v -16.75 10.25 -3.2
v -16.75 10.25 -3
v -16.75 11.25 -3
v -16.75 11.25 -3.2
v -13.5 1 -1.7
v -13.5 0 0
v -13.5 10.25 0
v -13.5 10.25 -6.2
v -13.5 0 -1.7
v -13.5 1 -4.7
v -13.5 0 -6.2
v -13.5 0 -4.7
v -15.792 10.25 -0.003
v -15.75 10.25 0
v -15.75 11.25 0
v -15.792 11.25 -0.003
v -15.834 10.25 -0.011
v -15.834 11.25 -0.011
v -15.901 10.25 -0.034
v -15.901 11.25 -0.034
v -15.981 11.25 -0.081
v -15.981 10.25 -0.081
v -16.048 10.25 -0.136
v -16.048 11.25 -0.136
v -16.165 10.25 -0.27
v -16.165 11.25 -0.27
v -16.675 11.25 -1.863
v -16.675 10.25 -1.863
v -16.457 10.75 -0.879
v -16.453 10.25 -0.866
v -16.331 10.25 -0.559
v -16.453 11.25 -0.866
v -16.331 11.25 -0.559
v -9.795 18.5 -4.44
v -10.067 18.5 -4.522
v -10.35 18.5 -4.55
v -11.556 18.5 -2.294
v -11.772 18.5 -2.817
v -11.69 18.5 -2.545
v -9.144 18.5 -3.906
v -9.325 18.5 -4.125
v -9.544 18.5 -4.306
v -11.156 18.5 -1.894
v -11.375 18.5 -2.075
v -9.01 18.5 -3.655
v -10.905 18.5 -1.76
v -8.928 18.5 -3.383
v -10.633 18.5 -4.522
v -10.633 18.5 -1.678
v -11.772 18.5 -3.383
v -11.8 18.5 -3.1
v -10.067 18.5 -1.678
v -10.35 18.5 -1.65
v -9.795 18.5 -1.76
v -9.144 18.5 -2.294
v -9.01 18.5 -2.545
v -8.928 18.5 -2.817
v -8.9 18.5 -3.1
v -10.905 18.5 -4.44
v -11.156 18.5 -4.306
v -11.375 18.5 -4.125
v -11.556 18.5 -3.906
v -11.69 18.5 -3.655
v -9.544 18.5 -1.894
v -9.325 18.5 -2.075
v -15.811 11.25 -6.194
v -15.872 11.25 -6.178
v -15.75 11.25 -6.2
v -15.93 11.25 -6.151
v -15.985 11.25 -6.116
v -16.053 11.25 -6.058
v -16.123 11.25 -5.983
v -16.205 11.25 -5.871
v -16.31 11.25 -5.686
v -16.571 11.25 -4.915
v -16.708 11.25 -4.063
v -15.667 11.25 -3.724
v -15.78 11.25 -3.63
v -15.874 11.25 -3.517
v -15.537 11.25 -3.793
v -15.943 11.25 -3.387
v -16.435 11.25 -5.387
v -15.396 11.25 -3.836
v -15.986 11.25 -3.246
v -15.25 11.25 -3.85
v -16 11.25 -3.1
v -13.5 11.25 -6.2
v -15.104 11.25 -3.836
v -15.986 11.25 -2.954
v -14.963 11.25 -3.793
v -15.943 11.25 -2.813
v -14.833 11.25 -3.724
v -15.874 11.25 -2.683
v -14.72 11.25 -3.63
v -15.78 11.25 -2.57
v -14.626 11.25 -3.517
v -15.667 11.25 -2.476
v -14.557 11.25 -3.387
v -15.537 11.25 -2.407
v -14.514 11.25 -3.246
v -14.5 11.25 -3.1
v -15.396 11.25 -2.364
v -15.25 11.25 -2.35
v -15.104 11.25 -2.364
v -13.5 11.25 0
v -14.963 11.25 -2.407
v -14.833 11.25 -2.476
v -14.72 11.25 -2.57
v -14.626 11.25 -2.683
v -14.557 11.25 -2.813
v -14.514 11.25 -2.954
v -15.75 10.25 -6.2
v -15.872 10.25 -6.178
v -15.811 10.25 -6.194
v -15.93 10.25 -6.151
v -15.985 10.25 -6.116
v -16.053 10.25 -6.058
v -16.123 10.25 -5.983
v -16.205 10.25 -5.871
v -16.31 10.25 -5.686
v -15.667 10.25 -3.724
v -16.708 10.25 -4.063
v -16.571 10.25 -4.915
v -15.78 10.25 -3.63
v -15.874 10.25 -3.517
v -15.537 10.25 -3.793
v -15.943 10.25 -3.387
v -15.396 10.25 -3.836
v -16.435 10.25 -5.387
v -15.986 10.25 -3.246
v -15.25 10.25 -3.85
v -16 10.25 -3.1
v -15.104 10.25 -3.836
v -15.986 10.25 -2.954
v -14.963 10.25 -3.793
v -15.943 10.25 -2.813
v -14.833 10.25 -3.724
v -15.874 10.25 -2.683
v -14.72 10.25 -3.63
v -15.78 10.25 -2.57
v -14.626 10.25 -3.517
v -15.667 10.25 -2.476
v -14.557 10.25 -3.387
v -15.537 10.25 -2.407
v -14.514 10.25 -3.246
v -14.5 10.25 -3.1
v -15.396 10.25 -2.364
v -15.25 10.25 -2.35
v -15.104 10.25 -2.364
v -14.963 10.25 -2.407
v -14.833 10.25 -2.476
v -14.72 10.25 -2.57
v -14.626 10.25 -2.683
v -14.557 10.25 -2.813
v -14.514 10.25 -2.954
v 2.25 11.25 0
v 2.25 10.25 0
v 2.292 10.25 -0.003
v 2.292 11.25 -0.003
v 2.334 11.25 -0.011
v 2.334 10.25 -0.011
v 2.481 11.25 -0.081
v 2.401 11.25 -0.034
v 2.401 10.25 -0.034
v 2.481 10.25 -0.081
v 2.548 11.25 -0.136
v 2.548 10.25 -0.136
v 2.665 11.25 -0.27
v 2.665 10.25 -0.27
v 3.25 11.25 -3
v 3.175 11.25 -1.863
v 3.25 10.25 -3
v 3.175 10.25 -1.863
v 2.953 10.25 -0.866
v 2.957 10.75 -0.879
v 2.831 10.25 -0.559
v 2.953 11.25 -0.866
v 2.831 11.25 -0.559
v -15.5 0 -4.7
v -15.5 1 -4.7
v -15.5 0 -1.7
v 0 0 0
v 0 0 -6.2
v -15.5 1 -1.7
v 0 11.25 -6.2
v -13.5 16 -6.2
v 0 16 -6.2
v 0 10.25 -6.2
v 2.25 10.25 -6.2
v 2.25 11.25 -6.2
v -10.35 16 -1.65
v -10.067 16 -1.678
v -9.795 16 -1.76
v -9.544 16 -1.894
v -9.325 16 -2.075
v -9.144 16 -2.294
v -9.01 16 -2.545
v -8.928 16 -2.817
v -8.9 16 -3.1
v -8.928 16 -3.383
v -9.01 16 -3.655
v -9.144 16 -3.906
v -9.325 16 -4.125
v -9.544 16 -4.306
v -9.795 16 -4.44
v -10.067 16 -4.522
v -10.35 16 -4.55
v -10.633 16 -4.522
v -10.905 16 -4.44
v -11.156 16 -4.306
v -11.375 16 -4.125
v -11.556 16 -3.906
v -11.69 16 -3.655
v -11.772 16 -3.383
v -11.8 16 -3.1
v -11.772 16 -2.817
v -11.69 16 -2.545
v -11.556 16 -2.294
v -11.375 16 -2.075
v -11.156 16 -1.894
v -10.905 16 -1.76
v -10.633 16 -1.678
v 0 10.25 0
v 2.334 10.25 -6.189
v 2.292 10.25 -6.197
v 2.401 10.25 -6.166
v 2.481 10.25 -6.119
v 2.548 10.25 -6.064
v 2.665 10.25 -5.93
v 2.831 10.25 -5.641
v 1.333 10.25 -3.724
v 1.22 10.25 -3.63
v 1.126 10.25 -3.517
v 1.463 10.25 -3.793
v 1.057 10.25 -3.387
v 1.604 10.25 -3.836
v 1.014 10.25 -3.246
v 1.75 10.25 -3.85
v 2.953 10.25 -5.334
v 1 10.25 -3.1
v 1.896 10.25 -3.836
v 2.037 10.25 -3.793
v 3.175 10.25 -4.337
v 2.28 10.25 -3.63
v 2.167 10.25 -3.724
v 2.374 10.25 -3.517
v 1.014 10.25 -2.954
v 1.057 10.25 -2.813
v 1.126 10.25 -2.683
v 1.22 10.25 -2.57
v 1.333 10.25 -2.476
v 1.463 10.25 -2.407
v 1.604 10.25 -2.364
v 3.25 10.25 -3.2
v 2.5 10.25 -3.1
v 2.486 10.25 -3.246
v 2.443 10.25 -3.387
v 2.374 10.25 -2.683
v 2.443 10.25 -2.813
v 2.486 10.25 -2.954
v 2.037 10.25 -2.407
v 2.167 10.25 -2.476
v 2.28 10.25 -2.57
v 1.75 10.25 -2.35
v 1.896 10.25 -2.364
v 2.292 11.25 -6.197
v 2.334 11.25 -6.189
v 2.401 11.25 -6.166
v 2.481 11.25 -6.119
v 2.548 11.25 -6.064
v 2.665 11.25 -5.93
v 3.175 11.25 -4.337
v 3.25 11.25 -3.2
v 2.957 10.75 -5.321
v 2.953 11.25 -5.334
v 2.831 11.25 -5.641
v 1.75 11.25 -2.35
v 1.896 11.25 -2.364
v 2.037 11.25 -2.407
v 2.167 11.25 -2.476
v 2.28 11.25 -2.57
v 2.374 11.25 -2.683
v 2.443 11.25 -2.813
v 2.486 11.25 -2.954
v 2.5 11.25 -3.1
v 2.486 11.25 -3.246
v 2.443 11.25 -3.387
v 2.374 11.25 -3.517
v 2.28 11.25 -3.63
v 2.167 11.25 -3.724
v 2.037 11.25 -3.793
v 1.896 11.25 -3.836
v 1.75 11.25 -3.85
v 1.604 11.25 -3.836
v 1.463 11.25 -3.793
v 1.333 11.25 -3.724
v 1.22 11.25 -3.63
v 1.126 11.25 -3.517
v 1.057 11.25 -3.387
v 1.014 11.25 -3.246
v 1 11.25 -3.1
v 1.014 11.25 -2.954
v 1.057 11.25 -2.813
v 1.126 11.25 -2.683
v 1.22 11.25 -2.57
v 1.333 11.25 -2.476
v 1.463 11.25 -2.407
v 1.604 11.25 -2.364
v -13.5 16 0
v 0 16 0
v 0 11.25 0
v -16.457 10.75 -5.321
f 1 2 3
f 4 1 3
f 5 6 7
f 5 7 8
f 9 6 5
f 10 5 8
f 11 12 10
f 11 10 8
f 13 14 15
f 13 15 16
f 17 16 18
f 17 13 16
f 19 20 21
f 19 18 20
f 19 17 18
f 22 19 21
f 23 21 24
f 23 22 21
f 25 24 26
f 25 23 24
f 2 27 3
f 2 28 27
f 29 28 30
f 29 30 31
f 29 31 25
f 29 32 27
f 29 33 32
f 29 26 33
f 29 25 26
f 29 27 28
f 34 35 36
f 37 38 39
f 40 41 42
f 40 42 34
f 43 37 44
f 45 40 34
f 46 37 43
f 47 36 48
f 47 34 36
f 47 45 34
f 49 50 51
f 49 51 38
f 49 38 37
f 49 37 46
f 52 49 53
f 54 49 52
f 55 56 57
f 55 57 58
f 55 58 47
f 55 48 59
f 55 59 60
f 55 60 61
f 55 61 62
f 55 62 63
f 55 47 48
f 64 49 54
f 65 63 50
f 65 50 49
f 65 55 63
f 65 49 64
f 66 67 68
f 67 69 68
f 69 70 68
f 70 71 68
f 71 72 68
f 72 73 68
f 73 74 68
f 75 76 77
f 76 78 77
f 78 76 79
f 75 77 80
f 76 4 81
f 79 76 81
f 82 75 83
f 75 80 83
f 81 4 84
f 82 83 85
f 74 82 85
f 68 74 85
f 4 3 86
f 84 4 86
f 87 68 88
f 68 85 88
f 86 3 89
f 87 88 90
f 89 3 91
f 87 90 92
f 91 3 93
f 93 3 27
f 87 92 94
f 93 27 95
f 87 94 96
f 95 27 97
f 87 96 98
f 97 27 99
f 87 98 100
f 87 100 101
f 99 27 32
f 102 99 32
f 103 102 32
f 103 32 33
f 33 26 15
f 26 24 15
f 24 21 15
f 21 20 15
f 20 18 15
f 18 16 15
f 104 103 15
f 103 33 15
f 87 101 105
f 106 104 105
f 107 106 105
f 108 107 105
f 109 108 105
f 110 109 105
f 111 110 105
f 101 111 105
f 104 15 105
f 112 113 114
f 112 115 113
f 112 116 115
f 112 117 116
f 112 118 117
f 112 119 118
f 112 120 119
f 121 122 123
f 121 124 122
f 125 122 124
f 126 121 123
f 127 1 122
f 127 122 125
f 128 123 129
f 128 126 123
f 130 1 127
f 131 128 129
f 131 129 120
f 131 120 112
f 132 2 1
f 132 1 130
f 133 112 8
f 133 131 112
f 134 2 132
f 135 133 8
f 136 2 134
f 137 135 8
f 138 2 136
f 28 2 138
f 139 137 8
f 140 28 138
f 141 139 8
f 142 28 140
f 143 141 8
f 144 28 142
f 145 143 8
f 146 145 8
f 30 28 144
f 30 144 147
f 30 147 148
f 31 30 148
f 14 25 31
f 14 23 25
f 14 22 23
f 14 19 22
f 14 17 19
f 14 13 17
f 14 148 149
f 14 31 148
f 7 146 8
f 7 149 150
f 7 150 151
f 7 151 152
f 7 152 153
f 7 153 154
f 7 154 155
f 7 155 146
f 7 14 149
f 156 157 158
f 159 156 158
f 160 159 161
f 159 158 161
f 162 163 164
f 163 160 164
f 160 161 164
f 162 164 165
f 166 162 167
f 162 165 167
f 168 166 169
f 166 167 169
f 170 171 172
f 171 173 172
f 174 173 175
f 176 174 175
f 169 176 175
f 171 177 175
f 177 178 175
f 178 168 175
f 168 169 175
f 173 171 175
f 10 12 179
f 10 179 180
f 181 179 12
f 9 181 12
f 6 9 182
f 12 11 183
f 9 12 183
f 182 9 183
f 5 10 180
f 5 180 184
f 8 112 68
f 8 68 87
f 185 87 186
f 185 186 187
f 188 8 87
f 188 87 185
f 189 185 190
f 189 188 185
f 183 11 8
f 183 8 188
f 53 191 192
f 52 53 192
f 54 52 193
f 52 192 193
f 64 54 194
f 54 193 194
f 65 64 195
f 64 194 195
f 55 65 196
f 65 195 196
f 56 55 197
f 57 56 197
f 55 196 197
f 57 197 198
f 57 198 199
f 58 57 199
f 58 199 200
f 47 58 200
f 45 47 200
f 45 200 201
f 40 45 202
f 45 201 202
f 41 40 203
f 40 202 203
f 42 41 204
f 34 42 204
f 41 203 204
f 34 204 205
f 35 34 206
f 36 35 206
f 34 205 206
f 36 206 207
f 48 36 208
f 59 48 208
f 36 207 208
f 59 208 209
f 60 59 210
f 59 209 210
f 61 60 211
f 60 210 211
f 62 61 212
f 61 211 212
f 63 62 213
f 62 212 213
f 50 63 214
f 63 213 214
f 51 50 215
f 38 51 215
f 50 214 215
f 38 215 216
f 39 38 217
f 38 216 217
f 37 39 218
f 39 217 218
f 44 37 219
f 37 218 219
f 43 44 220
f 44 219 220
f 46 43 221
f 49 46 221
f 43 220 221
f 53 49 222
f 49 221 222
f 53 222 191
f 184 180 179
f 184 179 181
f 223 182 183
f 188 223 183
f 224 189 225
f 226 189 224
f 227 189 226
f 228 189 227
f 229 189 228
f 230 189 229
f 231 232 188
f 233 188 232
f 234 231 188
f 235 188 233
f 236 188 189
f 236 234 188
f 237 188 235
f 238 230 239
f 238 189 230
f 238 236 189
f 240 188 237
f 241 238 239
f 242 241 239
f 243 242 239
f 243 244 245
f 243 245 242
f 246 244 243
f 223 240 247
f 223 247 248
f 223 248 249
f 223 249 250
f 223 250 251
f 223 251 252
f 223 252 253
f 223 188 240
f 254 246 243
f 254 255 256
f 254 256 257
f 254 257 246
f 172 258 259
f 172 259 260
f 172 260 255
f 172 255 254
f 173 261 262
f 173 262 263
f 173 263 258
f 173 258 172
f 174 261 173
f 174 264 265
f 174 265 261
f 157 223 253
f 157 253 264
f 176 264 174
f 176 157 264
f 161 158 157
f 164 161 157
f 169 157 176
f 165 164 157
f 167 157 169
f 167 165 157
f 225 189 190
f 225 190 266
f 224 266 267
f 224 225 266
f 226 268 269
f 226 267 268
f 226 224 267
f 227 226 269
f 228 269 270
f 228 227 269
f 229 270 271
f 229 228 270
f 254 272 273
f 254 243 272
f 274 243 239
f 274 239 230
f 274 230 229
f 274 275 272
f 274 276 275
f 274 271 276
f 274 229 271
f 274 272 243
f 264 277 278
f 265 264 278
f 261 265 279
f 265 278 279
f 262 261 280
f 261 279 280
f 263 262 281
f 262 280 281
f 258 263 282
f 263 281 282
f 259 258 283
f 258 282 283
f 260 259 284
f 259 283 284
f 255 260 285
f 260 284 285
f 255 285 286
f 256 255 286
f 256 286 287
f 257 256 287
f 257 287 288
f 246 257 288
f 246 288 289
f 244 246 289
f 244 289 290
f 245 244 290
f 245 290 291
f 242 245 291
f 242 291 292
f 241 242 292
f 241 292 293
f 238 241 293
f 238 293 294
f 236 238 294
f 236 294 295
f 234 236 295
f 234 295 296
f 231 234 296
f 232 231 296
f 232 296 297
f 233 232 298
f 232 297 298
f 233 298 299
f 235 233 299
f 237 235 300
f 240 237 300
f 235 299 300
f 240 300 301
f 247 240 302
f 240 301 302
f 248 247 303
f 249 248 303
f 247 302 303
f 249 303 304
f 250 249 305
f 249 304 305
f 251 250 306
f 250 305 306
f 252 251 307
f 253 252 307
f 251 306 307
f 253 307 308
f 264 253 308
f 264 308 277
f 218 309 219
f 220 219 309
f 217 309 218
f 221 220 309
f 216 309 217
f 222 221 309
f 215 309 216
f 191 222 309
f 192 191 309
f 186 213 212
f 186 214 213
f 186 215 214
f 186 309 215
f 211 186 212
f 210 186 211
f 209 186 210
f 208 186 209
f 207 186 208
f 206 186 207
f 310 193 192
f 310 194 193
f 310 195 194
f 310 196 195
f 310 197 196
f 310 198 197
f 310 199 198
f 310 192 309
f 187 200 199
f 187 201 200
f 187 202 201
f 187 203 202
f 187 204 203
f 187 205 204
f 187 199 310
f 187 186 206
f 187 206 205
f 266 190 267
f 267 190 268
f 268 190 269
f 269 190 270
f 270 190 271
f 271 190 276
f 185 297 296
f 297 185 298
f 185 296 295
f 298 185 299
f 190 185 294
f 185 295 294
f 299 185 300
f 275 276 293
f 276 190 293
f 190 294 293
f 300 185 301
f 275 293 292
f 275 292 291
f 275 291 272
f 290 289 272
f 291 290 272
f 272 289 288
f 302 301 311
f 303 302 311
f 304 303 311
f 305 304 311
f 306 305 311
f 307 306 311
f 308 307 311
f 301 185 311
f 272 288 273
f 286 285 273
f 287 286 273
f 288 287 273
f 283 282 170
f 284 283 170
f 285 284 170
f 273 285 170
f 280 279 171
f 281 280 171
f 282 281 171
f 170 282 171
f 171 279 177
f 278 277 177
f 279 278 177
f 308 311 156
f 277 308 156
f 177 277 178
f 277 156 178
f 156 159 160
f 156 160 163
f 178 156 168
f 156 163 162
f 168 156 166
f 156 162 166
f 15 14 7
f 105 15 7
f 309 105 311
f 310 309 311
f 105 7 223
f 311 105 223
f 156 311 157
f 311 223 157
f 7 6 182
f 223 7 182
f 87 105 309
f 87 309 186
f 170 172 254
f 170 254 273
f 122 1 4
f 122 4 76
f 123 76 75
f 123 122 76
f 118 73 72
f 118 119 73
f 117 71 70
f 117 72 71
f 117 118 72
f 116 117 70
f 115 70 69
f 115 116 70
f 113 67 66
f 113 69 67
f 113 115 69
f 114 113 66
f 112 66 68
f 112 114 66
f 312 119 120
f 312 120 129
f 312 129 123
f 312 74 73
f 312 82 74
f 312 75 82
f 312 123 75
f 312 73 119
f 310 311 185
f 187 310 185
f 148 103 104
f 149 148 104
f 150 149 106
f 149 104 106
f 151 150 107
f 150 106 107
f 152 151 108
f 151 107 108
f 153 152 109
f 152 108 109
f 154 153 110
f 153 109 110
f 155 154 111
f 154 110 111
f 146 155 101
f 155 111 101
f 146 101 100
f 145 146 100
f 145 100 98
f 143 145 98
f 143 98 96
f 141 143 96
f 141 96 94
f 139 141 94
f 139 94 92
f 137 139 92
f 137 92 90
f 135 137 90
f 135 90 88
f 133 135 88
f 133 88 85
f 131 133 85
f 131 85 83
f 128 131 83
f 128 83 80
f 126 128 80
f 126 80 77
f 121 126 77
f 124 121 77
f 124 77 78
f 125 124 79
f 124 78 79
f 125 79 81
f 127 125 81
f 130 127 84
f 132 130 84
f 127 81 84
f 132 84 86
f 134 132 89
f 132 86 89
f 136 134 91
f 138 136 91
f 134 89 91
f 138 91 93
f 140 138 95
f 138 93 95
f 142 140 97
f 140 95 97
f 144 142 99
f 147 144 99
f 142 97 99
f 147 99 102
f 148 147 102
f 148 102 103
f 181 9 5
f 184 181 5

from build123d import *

# Parameters (mm, degrees)
SKETCH_1_W          = 13.5
SKETCH_1_H          = 6.2
EXTRUDE_1_DEPTH     = 16
SKETCH_2_W          = 3.25
SKETCH_2_H          = 1
EXTRUDE_2_DEPTH     = 6.2
SKETCH_3_R          = 0.75
CUT_EXTRUDE_1_DEPTH = 22.108410646
SKETCH_4_R          = 1.45
EXTRUDE_3_DEPTH     = 2.5
FILLET_1_SIZE       = 1
FILLET_1_SIZE_2     = 3
FILLET_2_SIZE       = 1
FILLET_2_SIZE_2     = 3
SKETCH_5_W          = 3
SKETCH_5_H          = 1
EXTRUDE_4_DEPTH     = 2


with BuildPart() as part:
    # 草图1 → 凸台-拉伸1 (new body)
    with BuildSketch(Plane(origin=(0, 0, 0), x_dir=(1, 0, 0), z_dir=(0, 1, 0))):
        with Locations((-6.75, 3.1)):
            Rectangle(SKETCH_1_W, SKETCH_1_H)
    extrude(amount=EXTRUDE_1_DEPTH)

    # 草图2 → 凸台-拉伸2 (add)
    with BuildSketch(Plane.XY):
        with Locations((1.625, 10.75)):
            Rectangle(SKETCH_2_W, SKETCH_2_H)
        with Locations((-15.125, 10.75)):
            Rectangle(SKETCH_2_W, SKETCH_2_H)
    extrude(amount=-EXTRUDE_2_DEPTH)

    # 草图3 → 切除-拉伸1 (cut, through all)
    with BuildSketch(Plane(origin=(0, 11.25, 0), x_dir=(1, 0, 0), z_dir=(0, 1, 0))):
        with Locations(Location((-15.25, 3.1, 0), (0, 0, 270))):
            Circle(SKETCH_3_R)
        with Locations(Location((1.75, 3.1, 0), (0, 0, 270))):
            Circle(SKETCH_3_R)
    extrude(amount=-CUT_EXTRUDE_1_DEPTH, mode=Mode.SUBTRACT)

    # 草图4 → 凸台-拉伸3 (add)
    with BuildSketch(Plane(origin=(0, 16, 0), x_dir=(1, 0, 0), z_dir=(0, 1, 0))):
        with Locations(Location((-10.35, 3.1, 0), (0, 0, 270))):
            Circle(SKETCH_4_R)
    extrude(amount=EXTRUDE_3_DEPTH)

    # 圆角1
    # an asymmetric fillet: 3, 1 mm, written as the material it takes off along each edge
    with BuildSketch(Plane(origin=(3.25, 2.75, 0), x_dir=(-1, 0, 0), z_dir=(0, 1, 0))) as fillet_1_piece_1:
        with BuildLine():
            Bezier((FILLET_1_SIZE, 0), (0, 0), (0, -FILLET_1_SIZE_2), weights=[1, 0.707106781, 1])
            Line((0, -FILLET_1_SIZE_2), (0, 0))
            Line((0, 0), (FILLET_1_SIZE, 0))
        make_face()
    extrude(amount=16, mode=Mode.SUBTRACT)
    with BuildSketch(Plane(origin=(-16.75, 2.75, -6.2), x_dir=(0, 0, 1), z_dir=(0, 1, 0))) as fillet_1_piece_2:
        with BuildLine():
            Bezier((FILLET_1_SIZE_2, 0), (0, 0), (0, FILLET_1_SIZE), weights=[1, 0.707106781, 1])
            Line((0, FILLET_1_SIZE), (0, 0))
            Line((0, 0), (FILLET_1_SIZE_2, 0))
        make_face()
    extrude(amount=16, mode=Mode.SUBTRACT)

    # 圆角2
    # an asymmetric fillet: 3, 1 mm, written as the material it takes off along each edge
    with BuildSketch(Plane(origin=(-16.75, 2.75, 0), x_dir=(1, 0, 0), z_dir=(0, 1, 0)), Plane(origin=(3.25, 2.75, -6.2), x_dir=(-1, 0, 0), z_dir=(0, 1, 0))) as fillet_2_piece_1:
        with BuildLine():
            Bezier((FILLET_2_SIZE, 0), (0, 0), (0, FILLET_2_SIZE_2), weights=[1, 0.707106781, 1])
            Line((0, FILLET_2_SIZE_2), (0, 0))
            Line((0, 0), (FILLET_2_SIZE, 0))
        make_face()
    extrude(amount=16, mode=Mode.SUBTRACT)

    # 草图5 → 凸台-拉伸4 (add)
    with BuildSketch(Plane.ZY.offset(13.5)):
        with Locations((-3.2, 0.5)):
            Rectangle(SKETCH_5_W, SKETCH_5_H)
    extrude(amount=EXTRUDE_4_DEPTH)


solid = part.part
